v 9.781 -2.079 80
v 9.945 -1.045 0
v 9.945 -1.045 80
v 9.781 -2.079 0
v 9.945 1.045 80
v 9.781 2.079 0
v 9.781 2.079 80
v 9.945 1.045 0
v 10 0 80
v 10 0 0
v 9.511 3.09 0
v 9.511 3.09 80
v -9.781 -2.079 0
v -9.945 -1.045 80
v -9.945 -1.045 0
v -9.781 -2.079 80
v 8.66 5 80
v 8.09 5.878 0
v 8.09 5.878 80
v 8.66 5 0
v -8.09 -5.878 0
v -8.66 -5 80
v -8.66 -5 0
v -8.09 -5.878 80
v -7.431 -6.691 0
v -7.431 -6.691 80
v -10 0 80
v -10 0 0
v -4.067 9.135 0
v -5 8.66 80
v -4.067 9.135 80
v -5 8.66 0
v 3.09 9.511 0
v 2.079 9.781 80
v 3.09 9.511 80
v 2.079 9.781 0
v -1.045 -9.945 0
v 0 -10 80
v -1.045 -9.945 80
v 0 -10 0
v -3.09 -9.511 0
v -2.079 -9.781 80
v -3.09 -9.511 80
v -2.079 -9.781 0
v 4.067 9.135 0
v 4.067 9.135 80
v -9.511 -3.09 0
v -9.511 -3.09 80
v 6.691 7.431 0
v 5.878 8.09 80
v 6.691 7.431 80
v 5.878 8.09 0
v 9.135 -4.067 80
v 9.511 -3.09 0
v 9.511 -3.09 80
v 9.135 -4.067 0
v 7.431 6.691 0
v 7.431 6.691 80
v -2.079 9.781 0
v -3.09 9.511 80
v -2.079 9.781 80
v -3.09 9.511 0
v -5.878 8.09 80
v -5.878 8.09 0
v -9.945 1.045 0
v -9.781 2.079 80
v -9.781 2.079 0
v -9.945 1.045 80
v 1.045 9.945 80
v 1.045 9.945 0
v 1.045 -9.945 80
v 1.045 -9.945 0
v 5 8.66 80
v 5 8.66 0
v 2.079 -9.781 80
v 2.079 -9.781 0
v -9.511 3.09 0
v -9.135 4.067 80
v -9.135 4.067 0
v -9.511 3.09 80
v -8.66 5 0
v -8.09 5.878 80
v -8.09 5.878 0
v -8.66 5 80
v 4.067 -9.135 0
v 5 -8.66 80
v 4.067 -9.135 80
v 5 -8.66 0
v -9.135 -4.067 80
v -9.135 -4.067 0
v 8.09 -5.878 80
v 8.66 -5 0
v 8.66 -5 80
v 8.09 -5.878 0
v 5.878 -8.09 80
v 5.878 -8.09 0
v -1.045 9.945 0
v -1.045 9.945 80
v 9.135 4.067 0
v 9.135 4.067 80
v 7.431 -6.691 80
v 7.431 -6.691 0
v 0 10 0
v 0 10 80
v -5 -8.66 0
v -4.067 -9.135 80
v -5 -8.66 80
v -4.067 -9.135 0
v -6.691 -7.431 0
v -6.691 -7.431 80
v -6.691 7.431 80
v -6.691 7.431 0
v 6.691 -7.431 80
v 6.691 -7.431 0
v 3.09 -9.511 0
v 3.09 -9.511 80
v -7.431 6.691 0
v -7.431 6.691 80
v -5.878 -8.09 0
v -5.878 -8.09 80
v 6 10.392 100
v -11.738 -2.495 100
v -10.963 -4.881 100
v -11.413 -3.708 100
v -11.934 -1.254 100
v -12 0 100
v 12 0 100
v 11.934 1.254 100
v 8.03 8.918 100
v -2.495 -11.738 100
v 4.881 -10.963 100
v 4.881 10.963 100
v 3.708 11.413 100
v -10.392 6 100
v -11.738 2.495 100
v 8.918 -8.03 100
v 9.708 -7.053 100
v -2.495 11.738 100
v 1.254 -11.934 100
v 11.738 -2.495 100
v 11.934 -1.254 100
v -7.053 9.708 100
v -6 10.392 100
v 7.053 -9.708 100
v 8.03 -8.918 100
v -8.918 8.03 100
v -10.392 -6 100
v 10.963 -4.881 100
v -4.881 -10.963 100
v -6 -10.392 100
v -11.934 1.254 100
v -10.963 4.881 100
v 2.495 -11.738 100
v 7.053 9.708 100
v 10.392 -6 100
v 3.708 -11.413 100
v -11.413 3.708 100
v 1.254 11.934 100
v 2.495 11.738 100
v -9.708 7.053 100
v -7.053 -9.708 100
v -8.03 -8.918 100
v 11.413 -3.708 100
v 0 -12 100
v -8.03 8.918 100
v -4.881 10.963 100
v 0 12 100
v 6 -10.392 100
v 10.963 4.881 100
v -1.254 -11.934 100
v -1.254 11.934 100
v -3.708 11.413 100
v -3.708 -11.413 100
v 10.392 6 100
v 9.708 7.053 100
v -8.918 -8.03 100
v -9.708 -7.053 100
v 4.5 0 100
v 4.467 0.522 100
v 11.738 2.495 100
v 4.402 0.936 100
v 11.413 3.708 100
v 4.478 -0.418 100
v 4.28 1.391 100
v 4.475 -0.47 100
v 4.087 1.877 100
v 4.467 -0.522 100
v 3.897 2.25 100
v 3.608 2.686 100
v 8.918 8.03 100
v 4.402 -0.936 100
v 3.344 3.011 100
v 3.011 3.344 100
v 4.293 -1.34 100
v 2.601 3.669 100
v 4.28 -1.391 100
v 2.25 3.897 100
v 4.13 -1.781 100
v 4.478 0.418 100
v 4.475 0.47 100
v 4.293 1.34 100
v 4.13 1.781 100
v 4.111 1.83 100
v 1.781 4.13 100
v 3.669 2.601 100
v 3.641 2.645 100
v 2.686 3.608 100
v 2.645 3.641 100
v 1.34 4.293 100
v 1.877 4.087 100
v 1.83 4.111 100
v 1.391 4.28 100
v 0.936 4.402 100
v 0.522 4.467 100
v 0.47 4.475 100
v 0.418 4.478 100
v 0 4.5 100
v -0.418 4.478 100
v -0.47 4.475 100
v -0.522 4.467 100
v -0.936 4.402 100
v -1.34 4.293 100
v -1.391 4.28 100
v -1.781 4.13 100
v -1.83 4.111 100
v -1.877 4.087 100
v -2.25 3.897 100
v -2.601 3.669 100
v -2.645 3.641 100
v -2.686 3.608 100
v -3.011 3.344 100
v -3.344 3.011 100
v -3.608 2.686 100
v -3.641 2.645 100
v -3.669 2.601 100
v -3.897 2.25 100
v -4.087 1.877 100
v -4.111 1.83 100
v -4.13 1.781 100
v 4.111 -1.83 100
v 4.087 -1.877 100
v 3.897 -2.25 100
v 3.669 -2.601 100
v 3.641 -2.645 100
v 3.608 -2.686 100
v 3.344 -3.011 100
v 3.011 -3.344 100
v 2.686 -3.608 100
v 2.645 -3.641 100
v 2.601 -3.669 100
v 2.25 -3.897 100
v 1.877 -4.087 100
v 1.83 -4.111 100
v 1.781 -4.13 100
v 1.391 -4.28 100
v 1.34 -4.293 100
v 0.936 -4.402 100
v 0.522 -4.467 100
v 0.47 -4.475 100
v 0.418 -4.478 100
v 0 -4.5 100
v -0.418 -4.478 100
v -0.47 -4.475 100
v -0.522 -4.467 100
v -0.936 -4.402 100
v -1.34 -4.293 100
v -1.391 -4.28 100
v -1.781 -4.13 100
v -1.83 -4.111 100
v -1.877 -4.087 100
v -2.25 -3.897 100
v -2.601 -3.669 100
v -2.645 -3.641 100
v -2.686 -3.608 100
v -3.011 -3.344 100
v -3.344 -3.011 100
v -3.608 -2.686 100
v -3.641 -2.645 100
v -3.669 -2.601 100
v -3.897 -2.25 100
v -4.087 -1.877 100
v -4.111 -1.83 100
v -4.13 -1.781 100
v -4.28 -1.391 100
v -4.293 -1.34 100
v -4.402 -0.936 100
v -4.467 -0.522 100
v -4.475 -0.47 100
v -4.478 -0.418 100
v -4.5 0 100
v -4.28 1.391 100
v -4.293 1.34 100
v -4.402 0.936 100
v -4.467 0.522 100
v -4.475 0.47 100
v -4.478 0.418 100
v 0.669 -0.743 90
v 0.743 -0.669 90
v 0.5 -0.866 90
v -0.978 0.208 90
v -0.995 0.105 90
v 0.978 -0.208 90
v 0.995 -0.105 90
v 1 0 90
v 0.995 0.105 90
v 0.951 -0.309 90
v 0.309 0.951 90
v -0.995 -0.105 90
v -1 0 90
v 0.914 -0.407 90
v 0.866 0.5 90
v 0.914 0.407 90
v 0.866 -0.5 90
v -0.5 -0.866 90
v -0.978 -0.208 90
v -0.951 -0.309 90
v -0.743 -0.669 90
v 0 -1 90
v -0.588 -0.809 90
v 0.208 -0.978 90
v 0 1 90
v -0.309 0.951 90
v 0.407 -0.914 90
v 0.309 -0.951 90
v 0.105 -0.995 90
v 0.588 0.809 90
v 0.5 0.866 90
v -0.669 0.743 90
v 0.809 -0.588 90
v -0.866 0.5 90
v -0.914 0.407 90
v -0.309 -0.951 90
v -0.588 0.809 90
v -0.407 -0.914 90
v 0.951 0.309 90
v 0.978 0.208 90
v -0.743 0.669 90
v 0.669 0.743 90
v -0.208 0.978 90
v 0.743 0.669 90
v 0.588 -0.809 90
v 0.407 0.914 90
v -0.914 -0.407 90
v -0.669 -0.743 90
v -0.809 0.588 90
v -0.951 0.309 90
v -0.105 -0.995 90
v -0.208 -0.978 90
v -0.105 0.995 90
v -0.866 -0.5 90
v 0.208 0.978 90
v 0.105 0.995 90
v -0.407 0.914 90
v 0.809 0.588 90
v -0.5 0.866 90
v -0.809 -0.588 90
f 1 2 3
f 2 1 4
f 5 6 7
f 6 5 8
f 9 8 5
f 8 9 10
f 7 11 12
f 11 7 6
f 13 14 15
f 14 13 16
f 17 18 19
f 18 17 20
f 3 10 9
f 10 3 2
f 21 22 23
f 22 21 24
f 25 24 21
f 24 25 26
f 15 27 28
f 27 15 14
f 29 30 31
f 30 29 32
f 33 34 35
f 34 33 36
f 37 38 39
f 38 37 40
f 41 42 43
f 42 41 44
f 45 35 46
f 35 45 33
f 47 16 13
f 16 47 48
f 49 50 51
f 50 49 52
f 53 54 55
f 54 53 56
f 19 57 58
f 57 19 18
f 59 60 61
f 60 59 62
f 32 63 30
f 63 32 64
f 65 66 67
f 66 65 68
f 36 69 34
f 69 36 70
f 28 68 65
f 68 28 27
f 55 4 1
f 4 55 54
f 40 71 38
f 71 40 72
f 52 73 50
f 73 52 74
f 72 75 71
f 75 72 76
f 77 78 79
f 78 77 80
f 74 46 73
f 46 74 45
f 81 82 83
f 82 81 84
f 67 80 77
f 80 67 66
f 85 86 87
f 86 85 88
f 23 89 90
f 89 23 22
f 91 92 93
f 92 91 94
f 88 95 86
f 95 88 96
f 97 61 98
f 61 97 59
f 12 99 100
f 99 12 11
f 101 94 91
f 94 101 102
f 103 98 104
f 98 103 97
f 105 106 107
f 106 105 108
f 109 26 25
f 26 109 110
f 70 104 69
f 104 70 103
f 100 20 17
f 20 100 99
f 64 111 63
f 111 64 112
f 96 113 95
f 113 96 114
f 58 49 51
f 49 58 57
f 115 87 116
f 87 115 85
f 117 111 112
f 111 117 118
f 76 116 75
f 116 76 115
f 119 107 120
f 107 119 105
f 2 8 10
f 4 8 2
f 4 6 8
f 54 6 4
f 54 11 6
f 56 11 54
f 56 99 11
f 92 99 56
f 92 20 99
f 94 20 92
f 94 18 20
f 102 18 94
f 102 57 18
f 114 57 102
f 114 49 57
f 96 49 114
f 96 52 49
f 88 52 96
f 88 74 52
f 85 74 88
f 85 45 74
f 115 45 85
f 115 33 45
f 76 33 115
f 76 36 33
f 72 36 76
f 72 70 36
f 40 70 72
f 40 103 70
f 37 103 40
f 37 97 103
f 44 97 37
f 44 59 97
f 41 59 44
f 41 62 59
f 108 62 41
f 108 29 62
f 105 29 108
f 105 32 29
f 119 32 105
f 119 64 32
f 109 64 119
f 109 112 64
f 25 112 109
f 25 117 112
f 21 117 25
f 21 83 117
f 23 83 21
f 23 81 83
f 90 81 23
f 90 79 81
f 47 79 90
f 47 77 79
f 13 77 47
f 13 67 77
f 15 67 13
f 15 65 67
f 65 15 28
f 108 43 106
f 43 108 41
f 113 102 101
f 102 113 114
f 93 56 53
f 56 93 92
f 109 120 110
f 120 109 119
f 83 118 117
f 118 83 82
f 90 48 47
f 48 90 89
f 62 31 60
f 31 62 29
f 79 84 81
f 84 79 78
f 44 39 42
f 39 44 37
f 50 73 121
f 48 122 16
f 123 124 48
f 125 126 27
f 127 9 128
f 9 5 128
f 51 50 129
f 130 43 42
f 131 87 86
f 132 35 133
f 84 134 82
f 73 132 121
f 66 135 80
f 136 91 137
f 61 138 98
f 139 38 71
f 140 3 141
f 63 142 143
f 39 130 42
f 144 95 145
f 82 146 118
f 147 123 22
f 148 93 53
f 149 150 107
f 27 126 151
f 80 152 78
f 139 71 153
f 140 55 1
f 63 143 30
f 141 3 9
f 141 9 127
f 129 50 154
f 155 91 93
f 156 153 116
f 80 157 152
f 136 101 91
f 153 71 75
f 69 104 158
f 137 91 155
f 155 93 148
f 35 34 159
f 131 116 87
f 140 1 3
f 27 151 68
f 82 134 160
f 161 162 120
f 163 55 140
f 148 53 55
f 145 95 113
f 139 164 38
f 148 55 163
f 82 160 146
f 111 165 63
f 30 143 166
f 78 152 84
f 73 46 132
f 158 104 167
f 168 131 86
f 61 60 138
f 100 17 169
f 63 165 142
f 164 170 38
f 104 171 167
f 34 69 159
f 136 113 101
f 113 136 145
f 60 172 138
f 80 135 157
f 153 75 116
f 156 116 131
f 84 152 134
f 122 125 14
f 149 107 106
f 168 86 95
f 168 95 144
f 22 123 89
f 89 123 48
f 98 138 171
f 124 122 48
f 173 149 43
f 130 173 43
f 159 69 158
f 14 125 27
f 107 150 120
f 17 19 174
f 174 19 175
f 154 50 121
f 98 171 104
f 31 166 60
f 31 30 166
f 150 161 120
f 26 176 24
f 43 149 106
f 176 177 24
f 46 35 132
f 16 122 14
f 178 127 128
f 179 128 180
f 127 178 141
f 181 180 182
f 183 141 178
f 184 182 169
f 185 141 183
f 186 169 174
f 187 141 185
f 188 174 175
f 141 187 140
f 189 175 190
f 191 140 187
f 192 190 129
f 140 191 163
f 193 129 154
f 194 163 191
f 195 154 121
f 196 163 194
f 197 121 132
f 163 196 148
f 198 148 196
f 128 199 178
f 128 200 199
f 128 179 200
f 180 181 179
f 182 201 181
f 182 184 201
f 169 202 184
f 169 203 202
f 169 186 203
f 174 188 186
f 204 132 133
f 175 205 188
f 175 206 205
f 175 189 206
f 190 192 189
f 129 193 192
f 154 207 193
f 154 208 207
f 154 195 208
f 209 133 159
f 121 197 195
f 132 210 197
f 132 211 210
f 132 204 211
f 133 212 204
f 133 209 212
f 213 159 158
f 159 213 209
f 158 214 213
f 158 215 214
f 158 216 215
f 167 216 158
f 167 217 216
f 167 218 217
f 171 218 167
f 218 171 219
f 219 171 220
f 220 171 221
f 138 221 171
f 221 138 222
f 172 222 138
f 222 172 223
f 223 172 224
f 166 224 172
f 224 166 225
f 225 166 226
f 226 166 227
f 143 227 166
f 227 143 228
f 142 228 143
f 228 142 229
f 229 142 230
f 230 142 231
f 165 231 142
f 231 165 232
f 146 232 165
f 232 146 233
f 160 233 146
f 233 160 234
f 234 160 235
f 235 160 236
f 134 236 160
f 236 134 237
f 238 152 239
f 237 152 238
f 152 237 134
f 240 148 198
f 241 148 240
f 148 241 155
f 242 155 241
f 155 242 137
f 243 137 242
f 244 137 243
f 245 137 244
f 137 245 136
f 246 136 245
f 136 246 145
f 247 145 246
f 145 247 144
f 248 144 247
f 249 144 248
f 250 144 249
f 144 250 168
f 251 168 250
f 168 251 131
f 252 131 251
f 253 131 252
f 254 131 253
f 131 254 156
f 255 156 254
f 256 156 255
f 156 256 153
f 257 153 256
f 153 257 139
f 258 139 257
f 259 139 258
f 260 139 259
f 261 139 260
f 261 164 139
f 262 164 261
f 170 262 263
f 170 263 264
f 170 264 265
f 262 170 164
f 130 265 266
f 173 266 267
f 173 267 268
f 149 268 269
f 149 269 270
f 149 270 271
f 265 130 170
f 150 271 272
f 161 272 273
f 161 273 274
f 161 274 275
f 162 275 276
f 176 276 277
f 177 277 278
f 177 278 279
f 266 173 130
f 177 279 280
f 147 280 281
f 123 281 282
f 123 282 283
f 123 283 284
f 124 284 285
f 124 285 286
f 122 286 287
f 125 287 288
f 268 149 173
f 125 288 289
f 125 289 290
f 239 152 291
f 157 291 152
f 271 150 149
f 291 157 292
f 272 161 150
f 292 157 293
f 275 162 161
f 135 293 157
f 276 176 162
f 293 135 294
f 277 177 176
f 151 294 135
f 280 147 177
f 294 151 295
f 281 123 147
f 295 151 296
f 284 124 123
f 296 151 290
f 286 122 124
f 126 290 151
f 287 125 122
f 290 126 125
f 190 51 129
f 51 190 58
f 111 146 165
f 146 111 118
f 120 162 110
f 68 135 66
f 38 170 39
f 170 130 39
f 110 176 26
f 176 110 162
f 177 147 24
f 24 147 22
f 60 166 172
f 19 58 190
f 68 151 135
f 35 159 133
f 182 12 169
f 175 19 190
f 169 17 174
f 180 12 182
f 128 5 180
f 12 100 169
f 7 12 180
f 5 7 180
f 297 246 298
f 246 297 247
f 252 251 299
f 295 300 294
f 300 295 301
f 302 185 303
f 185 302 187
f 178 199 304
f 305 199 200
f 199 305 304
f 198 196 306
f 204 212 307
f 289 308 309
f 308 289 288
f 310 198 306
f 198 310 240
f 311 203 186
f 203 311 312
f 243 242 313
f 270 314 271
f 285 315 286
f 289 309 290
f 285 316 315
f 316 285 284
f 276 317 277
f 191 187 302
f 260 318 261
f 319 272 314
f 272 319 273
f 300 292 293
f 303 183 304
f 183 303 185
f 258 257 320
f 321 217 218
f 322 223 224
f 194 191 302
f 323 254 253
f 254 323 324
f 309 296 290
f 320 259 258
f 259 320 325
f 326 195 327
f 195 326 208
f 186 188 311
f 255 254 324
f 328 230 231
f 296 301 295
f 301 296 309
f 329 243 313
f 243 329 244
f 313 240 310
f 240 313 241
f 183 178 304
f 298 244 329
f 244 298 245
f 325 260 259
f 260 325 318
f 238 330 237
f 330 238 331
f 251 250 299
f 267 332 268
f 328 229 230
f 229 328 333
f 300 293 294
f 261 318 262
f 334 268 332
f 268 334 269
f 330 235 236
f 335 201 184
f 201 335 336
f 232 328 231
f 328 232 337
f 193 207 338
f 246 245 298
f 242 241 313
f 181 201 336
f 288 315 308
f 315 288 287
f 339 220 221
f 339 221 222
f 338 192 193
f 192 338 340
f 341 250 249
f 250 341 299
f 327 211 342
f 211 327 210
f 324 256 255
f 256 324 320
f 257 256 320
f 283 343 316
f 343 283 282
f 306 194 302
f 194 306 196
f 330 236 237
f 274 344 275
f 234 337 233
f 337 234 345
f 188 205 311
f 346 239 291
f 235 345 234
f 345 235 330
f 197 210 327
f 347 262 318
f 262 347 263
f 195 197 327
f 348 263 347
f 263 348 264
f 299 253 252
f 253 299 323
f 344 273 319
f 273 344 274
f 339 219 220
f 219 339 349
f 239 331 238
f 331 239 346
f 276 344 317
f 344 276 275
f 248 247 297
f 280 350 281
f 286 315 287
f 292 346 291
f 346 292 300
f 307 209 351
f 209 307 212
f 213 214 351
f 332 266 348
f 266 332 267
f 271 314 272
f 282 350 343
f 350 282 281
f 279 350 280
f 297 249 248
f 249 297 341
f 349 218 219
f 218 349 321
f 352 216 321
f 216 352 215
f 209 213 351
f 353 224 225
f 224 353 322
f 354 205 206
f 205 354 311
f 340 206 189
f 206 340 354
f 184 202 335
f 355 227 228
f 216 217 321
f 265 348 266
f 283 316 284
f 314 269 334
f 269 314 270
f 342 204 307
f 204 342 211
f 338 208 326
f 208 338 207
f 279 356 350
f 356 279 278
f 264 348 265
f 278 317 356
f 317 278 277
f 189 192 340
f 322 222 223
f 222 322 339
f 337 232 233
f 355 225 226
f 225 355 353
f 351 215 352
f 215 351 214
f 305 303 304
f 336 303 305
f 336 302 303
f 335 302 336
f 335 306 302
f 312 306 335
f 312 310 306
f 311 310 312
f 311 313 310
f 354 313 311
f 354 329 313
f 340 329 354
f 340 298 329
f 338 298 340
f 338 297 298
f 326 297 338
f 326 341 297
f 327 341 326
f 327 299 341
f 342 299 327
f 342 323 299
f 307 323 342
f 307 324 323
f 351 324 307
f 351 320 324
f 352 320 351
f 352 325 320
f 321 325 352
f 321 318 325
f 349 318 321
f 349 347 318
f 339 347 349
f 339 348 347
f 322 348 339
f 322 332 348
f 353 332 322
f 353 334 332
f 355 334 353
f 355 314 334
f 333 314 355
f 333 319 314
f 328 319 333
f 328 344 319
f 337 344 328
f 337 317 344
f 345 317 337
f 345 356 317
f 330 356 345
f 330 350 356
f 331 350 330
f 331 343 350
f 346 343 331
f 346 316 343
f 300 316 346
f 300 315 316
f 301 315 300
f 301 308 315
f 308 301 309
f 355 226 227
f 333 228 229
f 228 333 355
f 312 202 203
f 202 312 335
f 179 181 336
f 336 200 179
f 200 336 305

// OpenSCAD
// =================================================================
// TUF CAP APPLICATOR TOOL
// Manual Fracture-Zone Sealing Tool
// =================================================================
$fn = 60;

module cap_applicator() {
    difference() {
        // Handle and body
        union() {
            cylinder(h=80, r=10); // Handle
            translate([0, 0, 80]) cylinder(h=20, r1=10, r2=12); // Funnel base
        }
        
        // Internal tapered cavity to stretch the cap
        translate([0, 0, 90])
        cylinder(h=20, r1=1, r2=8); 
    }
}

cap_applicator();
